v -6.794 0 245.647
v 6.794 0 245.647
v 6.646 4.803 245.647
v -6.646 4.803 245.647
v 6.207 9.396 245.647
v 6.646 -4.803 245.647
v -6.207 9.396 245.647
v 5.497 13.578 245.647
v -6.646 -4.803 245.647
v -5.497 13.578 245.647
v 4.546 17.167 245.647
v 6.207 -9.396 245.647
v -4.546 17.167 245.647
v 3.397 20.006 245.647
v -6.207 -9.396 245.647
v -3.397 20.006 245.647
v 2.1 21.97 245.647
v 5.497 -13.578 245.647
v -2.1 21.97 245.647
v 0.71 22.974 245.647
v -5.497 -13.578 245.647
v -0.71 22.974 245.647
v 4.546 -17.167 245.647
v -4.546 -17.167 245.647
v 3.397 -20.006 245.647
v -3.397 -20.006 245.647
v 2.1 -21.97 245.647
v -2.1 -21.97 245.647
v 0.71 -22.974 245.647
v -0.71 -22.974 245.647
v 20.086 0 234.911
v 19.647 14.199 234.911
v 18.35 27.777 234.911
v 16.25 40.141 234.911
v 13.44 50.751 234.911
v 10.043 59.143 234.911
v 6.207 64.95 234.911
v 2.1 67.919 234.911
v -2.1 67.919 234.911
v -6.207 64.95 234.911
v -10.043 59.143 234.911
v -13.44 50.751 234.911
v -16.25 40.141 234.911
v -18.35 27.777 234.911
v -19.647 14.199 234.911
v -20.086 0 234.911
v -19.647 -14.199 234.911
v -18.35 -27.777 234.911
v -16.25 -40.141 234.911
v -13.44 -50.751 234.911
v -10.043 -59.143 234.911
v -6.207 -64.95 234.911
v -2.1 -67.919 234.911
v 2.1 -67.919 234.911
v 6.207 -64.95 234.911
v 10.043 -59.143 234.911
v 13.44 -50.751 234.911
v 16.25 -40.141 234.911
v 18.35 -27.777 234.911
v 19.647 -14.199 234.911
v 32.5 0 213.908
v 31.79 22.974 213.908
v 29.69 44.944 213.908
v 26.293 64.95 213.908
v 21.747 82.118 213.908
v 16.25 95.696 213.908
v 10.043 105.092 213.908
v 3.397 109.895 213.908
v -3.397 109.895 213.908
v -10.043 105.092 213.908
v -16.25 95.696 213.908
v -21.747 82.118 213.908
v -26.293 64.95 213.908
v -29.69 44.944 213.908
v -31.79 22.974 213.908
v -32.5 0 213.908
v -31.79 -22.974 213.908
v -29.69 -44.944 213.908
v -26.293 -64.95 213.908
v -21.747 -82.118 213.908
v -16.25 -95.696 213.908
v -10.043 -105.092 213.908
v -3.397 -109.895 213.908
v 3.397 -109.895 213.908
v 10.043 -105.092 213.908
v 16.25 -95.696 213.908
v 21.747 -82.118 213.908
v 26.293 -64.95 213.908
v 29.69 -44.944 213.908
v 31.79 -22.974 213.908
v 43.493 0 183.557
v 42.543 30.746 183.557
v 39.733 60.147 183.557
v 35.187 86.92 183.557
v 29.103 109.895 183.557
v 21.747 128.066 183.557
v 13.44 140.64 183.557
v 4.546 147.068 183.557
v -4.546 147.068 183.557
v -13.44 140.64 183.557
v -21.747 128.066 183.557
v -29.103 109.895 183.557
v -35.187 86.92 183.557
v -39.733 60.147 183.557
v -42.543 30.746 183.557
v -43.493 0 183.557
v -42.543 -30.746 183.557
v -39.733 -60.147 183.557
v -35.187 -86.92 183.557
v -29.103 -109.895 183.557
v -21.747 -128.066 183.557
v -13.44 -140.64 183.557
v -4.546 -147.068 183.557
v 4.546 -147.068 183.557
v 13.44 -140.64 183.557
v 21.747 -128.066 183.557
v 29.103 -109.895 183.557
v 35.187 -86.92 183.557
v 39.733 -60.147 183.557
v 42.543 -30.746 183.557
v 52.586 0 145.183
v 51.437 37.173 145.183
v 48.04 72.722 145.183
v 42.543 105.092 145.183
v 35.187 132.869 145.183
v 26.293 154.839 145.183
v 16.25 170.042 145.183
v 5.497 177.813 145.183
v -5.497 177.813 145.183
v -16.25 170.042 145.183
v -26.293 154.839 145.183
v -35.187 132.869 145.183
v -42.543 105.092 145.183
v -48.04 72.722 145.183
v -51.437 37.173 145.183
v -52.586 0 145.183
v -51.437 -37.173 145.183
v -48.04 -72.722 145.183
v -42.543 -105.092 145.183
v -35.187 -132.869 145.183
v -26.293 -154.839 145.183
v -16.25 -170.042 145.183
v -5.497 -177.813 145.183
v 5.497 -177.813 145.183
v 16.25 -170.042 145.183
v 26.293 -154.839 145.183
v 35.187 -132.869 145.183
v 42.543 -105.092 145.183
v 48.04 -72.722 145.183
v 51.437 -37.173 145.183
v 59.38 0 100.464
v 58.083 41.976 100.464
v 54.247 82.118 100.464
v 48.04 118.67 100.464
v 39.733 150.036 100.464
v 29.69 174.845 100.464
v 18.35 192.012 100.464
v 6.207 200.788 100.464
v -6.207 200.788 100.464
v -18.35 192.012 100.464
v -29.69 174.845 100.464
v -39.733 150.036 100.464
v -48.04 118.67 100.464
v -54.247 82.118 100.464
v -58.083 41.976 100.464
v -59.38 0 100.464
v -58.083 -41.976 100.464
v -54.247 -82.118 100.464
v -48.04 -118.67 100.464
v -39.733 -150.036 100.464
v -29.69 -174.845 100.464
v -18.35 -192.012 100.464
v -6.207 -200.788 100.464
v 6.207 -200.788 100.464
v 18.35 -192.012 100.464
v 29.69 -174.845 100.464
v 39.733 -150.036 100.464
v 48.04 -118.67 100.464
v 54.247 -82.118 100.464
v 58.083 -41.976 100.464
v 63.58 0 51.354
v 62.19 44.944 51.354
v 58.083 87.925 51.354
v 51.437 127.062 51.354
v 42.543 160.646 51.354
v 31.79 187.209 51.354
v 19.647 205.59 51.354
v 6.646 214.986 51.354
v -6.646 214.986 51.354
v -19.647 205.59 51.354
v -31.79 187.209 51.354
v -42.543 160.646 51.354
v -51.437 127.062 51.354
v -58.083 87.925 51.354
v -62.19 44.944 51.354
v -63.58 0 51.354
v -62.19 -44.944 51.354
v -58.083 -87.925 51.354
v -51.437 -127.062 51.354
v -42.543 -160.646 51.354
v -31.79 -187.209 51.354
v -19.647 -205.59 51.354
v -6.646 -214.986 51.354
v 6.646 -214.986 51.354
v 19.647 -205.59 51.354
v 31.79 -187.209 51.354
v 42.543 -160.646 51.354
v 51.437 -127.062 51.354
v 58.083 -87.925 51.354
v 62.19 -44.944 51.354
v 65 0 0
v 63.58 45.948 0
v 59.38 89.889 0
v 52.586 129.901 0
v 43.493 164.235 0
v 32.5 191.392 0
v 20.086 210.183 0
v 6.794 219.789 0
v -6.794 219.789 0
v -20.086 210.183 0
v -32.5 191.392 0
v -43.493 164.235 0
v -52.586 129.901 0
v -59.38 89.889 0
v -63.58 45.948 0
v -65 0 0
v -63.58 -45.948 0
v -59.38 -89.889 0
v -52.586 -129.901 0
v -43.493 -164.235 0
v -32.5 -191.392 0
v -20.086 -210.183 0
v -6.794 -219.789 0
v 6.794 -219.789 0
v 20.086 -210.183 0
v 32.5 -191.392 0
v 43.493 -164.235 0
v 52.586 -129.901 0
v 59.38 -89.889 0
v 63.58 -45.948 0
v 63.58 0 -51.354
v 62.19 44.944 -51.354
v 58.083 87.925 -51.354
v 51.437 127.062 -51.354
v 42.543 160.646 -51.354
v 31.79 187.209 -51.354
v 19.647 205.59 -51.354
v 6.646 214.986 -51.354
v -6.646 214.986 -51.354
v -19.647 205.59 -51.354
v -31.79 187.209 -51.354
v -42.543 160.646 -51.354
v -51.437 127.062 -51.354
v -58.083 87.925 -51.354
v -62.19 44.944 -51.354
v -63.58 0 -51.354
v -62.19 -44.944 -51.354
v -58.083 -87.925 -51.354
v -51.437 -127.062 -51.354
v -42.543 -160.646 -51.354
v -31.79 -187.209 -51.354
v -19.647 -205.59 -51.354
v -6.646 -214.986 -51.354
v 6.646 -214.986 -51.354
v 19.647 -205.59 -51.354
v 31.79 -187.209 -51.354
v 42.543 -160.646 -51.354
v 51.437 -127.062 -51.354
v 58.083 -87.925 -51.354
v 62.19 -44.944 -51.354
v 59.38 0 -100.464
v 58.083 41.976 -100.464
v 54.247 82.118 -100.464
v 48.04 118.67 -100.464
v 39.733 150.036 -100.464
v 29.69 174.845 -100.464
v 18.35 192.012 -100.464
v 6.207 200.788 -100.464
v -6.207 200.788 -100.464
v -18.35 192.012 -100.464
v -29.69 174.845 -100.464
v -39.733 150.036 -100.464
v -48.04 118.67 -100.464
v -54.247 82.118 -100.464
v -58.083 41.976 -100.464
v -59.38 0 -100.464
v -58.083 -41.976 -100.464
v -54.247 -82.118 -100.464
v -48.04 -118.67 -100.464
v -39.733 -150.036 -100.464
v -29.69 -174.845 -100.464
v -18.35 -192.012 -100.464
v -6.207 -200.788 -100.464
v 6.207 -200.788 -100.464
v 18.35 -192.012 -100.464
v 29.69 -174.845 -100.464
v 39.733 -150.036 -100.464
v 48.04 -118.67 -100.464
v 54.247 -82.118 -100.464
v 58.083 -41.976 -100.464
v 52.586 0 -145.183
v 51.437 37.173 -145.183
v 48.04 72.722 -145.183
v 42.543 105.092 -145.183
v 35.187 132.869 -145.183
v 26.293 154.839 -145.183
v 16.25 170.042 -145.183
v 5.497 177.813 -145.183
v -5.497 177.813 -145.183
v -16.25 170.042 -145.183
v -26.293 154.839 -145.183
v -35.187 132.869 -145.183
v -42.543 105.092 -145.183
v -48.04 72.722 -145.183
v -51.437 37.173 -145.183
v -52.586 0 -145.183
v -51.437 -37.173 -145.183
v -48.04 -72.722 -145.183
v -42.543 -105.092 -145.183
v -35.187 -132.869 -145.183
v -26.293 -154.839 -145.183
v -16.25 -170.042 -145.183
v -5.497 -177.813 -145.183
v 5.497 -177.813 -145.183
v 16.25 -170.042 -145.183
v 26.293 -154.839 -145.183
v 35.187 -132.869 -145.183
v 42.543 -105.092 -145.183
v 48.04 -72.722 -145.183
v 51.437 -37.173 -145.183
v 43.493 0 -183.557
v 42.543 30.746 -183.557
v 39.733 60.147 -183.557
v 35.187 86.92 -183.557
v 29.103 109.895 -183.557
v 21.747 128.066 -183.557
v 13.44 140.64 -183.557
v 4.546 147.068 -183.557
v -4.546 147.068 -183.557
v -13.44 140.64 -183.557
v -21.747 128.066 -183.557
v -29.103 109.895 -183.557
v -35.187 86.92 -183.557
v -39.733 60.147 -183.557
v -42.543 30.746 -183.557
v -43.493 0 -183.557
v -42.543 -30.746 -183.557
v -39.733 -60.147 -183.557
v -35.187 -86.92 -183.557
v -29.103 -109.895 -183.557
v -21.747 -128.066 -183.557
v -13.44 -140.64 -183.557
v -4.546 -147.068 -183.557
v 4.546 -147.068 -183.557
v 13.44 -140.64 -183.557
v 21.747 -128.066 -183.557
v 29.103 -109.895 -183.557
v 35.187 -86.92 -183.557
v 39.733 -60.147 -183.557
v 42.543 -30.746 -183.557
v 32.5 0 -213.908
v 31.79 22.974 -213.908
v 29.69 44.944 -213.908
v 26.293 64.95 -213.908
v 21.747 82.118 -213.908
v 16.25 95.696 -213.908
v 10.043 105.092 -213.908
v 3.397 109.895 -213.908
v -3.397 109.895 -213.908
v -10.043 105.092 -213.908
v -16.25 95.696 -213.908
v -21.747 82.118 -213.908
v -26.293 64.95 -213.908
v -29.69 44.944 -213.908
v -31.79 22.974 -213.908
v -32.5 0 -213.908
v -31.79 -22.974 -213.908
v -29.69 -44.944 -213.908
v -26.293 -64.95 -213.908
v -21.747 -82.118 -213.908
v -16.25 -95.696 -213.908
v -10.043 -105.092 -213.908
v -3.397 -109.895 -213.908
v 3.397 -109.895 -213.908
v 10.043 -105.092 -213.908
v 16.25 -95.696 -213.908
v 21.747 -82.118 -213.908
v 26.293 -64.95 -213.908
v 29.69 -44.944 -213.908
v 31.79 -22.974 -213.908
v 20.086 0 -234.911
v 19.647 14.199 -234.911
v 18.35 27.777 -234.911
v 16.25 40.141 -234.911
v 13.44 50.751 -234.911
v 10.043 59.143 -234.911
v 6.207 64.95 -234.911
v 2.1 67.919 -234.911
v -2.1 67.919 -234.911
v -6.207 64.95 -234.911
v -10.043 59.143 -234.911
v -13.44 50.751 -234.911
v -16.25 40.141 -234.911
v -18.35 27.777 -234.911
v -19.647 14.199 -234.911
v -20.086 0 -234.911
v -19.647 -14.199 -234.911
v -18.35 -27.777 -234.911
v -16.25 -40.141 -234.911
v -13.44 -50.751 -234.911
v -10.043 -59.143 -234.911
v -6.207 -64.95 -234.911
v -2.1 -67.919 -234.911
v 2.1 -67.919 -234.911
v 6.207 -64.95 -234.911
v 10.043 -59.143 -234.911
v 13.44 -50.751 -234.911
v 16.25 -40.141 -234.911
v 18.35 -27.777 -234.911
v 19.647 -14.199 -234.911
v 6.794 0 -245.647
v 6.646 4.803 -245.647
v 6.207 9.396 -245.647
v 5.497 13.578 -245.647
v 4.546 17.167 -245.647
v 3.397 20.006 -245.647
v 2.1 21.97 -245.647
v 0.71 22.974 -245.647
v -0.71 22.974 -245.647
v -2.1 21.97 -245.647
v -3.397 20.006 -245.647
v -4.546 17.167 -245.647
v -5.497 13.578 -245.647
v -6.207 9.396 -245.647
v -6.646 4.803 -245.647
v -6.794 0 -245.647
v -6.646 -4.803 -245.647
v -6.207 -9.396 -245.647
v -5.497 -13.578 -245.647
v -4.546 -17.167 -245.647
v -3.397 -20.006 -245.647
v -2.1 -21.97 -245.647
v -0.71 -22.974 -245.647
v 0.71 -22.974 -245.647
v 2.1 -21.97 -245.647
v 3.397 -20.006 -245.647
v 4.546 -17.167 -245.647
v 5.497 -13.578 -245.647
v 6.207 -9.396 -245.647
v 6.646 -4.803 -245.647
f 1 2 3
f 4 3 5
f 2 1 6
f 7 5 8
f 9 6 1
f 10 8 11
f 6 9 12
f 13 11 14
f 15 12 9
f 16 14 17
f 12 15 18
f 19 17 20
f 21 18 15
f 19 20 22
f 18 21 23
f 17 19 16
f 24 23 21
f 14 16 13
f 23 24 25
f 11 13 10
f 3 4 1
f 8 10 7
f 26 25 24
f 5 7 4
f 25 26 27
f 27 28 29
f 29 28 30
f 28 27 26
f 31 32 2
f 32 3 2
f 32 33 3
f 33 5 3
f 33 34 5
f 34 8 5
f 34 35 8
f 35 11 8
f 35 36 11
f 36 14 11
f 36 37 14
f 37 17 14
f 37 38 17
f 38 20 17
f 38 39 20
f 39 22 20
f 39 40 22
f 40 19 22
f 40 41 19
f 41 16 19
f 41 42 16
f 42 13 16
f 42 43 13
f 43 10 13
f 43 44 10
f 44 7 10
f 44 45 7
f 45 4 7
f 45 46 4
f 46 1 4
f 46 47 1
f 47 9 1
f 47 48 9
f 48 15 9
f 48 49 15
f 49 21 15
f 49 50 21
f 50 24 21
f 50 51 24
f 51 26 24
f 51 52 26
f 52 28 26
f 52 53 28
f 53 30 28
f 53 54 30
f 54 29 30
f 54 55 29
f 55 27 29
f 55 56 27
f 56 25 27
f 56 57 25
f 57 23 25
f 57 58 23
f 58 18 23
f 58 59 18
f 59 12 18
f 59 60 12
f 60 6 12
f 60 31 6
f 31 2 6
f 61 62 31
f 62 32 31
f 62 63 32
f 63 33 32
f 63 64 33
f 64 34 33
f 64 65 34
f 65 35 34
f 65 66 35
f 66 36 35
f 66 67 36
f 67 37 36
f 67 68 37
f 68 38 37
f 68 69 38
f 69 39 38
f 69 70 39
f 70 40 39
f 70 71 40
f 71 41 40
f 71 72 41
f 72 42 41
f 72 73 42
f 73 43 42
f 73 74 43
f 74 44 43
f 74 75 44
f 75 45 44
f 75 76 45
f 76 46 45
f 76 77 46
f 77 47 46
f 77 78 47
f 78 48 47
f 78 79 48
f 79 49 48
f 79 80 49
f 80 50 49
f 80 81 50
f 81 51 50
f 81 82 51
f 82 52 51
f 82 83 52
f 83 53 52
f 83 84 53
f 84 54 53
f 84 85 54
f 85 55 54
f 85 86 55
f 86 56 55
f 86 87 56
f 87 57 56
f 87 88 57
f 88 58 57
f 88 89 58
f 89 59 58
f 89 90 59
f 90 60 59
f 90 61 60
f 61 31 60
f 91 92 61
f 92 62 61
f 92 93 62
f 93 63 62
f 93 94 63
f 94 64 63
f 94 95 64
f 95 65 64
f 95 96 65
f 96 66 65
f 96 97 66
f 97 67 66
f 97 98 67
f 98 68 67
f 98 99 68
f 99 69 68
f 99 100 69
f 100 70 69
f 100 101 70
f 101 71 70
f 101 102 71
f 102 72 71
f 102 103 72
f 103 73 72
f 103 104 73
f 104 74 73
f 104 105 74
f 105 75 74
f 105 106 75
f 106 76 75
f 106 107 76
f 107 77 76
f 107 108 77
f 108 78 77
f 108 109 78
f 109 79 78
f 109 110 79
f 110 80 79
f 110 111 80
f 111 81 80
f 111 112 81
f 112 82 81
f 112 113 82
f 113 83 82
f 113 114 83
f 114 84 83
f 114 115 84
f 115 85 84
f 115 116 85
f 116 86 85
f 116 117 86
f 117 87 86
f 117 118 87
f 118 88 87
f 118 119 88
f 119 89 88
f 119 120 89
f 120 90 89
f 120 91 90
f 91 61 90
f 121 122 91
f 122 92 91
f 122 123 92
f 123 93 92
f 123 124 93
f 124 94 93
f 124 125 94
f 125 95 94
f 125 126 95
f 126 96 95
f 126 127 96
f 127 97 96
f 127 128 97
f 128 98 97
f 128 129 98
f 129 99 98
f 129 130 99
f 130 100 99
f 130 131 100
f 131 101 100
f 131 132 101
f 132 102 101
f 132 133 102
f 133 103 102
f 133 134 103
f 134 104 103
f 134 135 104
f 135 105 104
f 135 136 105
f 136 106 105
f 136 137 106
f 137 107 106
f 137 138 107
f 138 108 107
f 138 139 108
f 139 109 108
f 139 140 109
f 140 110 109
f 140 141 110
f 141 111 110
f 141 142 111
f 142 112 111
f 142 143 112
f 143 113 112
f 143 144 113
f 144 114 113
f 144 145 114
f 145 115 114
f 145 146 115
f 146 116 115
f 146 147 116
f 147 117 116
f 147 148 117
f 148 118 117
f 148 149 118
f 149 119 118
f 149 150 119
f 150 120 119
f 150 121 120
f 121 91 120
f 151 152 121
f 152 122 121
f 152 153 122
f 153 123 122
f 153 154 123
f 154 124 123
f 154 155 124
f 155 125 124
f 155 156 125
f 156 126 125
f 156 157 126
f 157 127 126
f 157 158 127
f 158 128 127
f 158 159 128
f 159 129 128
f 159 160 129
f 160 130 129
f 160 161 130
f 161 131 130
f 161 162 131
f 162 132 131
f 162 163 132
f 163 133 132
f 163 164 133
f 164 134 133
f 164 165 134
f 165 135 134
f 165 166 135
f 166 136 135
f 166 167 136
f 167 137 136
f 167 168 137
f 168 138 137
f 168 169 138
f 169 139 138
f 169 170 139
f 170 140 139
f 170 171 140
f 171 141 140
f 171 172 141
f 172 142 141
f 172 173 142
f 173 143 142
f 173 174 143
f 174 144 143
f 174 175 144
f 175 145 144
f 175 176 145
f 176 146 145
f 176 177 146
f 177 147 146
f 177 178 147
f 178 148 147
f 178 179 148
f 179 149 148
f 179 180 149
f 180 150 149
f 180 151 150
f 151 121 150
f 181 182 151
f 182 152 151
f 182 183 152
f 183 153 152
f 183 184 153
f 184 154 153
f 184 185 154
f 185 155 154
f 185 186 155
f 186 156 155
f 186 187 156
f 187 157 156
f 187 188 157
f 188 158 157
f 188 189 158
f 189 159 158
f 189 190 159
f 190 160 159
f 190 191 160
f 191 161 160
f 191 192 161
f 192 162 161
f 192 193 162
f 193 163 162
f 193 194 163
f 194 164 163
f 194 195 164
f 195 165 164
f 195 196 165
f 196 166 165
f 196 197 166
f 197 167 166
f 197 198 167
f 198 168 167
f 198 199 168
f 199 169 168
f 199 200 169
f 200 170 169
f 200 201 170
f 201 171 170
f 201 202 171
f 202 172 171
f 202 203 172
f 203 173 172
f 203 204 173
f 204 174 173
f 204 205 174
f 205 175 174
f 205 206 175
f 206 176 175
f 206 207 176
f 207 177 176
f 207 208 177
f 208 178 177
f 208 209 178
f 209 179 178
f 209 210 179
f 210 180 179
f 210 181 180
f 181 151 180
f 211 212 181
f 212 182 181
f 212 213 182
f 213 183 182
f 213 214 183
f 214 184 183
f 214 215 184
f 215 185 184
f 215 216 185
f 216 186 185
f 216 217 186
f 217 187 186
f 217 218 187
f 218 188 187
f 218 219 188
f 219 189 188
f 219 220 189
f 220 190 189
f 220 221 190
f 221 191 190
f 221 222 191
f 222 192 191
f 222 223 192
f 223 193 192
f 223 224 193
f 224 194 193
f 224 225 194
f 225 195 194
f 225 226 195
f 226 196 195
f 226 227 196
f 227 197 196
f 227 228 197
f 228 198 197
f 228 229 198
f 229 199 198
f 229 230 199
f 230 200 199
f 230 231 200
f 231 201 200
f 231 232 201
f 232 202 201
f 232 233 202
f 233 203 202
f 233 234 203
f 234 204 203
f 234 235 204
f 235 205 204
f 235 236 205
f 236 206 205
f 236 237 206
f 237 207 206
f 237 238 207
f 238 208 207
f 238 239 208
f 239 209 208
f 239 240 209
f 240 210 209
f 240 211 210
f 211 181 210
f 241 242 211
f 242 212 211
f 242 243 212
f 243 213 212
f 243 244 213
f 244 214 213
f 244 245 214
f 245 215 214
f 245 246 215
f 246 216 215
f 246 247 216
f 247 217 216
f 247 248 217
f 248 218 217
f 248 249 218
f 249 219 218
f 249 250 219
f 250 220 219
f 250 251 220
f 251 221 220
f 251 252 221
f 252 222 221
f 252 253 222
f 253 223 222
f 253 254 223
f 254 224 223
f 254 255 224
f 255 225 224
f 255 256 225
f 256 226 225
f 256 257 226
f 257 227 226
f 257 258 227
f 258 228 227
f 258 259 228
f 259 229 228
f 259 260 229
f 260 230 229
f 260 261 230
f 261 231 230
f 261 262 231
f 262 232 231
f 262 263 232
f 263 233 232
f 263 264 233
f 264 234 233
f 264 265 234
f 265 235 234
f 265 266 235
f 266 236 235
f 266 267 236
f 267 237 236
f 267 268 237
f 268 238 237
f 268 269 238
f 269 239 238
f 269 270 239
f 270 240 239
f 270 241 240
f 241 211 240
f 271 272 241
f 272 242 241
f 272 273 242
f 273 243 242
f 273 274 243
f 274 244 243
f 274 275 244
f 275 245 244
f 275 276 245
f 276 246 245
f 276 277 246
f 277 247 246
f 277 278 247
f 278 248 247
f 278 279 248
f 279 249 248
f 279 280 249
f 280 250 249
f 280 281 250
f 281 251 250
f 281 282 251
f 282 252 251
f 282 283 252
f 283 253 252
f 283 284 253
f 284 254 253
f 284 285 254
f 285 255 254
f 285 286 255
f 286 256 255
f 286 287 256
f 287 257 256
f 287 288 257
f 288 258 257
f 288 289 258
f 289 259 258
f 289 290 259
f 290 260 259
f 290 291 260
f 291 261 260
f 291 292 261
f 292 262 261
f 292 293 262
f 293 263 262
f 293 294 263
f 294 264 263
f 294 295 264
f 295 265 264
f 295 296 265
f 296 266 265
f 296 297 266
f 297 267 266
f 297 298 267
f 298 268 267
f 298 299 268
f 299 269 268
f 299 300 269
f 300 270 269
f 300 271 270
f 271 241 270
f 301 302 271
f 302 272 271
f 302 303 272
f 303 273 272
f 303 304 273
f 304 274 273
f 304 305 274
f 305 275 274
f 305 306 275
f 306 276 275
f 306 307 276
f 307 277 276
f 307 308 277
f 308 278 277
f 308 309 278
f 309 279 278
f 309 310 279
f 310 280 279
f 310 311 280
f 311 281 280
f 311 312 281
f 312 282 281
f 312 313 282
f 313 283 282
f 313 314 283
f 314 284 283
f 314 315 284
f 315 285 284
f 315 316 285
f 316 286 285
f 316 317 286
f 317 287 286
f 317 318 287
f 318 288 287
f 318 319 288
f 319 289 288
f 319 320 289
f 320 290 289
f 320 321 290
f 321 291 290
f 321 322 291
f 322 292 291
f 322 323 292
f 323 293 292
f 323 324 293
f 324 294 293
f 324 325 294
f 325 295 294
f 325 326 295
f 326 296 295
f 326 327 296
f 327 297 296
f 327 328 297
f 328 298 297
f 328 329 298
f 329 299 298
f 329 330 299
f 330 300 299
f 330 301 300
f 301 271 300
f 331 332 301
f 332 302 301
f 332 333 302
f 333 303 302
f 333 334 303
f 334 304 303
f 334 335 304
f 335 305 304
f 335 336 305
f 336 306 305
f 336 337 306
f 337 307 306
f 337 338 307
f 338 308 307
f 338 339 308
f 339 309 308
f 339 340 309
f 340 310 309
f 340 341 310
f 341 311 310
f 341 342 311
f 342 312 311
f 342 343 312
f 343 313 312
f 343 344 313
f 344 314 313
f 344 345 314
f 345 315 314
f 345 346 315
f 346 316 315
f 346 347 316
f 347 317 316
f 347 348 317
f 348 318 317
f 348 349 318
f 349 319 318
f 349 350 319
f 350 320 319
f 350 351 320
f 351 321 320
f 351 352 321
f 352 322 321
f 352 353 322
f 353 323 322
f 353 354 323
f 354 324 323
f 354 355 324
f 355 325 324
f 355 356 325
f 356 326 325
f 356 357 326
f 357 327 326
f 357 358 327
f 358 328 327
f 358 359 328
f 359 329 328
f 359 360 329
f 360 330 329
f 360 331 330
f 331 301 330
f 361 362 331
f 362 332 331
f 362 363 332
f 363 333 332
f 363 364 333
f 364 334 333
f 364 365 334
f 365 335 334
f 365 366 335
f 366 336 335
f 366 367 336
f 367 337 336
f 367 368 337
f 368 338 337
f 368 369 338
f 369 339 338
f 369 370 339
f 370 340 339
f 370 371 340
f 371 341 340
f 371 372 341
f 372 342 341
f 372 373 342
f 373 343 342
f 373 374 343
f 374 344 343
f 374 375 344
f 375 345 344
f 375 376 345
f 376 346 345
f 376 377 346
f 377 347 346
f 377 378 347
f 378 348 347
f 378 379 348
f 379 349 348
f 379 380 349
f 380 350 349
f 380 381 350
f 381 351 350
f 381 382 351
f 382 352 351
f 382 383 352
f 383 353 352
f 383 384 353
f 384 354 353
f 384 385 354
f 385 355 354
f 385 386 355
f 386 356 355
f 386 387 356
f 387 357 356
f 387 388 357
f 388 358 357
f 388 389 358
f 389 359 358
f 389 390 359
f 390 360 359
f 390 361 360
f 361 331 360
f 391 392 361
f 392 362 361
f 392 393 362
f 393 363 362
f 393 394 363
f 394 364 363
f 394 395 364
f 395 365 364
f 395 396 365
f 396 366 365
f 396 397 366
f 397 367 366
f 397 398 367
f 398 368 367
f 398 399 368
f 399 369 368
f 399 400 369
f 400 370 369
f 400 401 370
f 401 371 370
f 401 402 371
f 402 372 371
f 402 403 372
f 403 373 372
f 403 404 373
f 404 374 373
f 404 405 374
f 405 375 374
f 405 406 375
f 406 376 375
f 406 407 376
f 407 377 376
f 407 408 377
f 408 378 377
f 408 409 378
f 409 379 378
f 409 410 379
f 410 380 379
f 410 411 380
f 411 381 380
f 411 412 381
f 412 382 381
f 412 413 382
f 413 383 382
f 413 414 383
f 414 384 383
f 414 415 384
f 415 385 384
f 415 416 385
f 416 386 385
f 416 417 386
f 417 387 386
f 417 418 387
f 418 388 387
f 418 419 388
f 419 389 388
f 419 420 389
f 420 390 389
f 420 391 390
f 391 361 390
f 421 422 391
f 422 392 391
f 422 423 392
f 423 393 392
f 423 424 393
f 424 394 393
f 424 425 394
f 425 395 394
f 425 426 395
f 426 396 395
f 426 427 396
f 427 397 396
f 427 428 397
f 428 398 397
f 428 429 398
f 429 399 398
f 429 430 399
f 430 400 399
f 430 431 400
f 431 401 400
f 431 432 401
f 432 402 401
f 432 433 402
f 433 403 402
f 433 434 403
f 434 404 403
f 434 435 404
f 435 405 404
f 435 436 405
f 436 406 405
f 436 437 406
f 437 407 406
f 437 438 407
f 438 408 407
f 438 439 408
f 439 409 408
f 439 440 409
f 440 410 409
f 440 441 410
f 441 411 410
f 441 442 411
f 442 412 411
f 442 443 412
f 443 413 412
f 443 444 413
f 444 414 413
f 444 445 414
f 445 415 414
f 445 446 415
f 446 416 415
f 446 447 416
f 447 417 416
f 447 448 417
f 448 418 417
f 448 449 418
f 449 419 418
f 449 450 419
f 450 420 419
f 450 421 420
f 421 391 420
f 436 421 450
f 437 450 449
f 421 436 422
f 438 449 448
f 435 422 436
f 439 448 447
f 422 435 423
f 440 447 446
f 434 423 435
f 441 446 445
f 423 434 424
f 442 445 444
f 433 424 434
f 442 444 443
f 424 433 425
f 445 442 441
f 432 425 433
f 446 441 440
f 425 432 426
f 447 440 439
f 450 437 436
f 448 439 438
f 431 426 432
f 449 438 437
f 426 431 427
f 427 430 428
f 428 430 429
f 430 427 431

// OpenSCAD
// Generated by SolidPython 1.0.1 on 2020-07-29 00:46:47


scale(v = [5, 17, 19]) {
	sphere(r = 13);
}
/***********************************************
*********      SolidPython code:      **********
************************************************
 
# import packages: SolidPython
from solid import *
from solid.utils import *
from itertools import chain, combinations, permutations


class Resize:

    def __init__(self, scad_file):
        self.scad_file = scad_file
        #self.scad_file = import_scad(scad_file)
        # cone/cylinder param:
        self.r1 = 0
        self.r2 = 0
        self.h = 0
        # rectangular prism param:
        self.w = 0
        self.l = 0
        # ellipse param:
        self.r = 0

    # import OpenScad code (file name corresponds to shape)


    # classify shape + parameters
    def assign(self, param1, param2, param3):
        if self.scad_file == 'cone.scad':
            self.r1 = param1
            self.r2 = param2
            self.h = param3
        elif self.scad_file == 'cylinder.scad':
            self.r1 = param1
            self.r2 = param2
            self.h = param3
        elif self.scad_file == 'rectangularPrism.scad':
            self.h = param1
            self.l = param2
            self.w = param3
        else:
            self.r = param1
            self.h = param2

    # resize parameters
    def iterate(self):
        x = range(3, 20, 2)
        i = 1
        if self.scad_file == 'cone.scad':
            tempList = list(permutations(x, 2))
            for temp in tempList:
                param1 = temp[0]
                param2 = temp[1]
                filepath = 'produced_scad_files/' + 'cone' + str(param1) + '_' + str(param2) + '_' + '.scad'
                scad_render_to_file(cylinder(h=param1, r1=param2, r2=0), filepath)

        elif self.scad_file == 'cylinder.scad':
            tempList = list(permutations(x, 3))
            for temp in tempList:
                param1 = temp[0]
                param2 = temp[1]
                filepath = 'produced_scad_files/' + 'cylinder' + str(param1) + '_' + str(param2) + '_' + '.scad'
                scad_render_to_file(cylinder(h=param1, r1=param2, r2=param2), filepath)

        elif self.scad_file == 'rectangularPrism.scad':
            tempList = list(permutations(x, 3))
            for temp in tempList:
                param1 = temp[0]
                param2 = temp[1]
                param3 = temp[2]
                filepath = 'produced_scad_files/' + 'rectangularPrism' + str(param1) + '_' + str(param2) + '_' + str(
                    param3) + '.scad'
                scad_render_to_file(cube(size=(param1, param2, param3)), filepath)

        elif self.scad_file == 'ellipse.scad':
            tempList = list(permutations(x, 4))
            for temp in tempList:
                param1 = temp[0]
                param2 = temp[1]
                param3 = temp[2]
                param4 = temp[3]
                filepath = 'produced_scad_files/' + 'ellipse' + str(param1) + '_' + str(param2) + '_' + str(param3) + '_' + str(param4) + '.scad'
                scad_render_to_file(scale([param1, param2, param3])(sphere(r=param4)), filepath)

    def render_to_scadfile(self):
        scad_render_to_file(scad, 'example.scad') 
 
************************************************/
